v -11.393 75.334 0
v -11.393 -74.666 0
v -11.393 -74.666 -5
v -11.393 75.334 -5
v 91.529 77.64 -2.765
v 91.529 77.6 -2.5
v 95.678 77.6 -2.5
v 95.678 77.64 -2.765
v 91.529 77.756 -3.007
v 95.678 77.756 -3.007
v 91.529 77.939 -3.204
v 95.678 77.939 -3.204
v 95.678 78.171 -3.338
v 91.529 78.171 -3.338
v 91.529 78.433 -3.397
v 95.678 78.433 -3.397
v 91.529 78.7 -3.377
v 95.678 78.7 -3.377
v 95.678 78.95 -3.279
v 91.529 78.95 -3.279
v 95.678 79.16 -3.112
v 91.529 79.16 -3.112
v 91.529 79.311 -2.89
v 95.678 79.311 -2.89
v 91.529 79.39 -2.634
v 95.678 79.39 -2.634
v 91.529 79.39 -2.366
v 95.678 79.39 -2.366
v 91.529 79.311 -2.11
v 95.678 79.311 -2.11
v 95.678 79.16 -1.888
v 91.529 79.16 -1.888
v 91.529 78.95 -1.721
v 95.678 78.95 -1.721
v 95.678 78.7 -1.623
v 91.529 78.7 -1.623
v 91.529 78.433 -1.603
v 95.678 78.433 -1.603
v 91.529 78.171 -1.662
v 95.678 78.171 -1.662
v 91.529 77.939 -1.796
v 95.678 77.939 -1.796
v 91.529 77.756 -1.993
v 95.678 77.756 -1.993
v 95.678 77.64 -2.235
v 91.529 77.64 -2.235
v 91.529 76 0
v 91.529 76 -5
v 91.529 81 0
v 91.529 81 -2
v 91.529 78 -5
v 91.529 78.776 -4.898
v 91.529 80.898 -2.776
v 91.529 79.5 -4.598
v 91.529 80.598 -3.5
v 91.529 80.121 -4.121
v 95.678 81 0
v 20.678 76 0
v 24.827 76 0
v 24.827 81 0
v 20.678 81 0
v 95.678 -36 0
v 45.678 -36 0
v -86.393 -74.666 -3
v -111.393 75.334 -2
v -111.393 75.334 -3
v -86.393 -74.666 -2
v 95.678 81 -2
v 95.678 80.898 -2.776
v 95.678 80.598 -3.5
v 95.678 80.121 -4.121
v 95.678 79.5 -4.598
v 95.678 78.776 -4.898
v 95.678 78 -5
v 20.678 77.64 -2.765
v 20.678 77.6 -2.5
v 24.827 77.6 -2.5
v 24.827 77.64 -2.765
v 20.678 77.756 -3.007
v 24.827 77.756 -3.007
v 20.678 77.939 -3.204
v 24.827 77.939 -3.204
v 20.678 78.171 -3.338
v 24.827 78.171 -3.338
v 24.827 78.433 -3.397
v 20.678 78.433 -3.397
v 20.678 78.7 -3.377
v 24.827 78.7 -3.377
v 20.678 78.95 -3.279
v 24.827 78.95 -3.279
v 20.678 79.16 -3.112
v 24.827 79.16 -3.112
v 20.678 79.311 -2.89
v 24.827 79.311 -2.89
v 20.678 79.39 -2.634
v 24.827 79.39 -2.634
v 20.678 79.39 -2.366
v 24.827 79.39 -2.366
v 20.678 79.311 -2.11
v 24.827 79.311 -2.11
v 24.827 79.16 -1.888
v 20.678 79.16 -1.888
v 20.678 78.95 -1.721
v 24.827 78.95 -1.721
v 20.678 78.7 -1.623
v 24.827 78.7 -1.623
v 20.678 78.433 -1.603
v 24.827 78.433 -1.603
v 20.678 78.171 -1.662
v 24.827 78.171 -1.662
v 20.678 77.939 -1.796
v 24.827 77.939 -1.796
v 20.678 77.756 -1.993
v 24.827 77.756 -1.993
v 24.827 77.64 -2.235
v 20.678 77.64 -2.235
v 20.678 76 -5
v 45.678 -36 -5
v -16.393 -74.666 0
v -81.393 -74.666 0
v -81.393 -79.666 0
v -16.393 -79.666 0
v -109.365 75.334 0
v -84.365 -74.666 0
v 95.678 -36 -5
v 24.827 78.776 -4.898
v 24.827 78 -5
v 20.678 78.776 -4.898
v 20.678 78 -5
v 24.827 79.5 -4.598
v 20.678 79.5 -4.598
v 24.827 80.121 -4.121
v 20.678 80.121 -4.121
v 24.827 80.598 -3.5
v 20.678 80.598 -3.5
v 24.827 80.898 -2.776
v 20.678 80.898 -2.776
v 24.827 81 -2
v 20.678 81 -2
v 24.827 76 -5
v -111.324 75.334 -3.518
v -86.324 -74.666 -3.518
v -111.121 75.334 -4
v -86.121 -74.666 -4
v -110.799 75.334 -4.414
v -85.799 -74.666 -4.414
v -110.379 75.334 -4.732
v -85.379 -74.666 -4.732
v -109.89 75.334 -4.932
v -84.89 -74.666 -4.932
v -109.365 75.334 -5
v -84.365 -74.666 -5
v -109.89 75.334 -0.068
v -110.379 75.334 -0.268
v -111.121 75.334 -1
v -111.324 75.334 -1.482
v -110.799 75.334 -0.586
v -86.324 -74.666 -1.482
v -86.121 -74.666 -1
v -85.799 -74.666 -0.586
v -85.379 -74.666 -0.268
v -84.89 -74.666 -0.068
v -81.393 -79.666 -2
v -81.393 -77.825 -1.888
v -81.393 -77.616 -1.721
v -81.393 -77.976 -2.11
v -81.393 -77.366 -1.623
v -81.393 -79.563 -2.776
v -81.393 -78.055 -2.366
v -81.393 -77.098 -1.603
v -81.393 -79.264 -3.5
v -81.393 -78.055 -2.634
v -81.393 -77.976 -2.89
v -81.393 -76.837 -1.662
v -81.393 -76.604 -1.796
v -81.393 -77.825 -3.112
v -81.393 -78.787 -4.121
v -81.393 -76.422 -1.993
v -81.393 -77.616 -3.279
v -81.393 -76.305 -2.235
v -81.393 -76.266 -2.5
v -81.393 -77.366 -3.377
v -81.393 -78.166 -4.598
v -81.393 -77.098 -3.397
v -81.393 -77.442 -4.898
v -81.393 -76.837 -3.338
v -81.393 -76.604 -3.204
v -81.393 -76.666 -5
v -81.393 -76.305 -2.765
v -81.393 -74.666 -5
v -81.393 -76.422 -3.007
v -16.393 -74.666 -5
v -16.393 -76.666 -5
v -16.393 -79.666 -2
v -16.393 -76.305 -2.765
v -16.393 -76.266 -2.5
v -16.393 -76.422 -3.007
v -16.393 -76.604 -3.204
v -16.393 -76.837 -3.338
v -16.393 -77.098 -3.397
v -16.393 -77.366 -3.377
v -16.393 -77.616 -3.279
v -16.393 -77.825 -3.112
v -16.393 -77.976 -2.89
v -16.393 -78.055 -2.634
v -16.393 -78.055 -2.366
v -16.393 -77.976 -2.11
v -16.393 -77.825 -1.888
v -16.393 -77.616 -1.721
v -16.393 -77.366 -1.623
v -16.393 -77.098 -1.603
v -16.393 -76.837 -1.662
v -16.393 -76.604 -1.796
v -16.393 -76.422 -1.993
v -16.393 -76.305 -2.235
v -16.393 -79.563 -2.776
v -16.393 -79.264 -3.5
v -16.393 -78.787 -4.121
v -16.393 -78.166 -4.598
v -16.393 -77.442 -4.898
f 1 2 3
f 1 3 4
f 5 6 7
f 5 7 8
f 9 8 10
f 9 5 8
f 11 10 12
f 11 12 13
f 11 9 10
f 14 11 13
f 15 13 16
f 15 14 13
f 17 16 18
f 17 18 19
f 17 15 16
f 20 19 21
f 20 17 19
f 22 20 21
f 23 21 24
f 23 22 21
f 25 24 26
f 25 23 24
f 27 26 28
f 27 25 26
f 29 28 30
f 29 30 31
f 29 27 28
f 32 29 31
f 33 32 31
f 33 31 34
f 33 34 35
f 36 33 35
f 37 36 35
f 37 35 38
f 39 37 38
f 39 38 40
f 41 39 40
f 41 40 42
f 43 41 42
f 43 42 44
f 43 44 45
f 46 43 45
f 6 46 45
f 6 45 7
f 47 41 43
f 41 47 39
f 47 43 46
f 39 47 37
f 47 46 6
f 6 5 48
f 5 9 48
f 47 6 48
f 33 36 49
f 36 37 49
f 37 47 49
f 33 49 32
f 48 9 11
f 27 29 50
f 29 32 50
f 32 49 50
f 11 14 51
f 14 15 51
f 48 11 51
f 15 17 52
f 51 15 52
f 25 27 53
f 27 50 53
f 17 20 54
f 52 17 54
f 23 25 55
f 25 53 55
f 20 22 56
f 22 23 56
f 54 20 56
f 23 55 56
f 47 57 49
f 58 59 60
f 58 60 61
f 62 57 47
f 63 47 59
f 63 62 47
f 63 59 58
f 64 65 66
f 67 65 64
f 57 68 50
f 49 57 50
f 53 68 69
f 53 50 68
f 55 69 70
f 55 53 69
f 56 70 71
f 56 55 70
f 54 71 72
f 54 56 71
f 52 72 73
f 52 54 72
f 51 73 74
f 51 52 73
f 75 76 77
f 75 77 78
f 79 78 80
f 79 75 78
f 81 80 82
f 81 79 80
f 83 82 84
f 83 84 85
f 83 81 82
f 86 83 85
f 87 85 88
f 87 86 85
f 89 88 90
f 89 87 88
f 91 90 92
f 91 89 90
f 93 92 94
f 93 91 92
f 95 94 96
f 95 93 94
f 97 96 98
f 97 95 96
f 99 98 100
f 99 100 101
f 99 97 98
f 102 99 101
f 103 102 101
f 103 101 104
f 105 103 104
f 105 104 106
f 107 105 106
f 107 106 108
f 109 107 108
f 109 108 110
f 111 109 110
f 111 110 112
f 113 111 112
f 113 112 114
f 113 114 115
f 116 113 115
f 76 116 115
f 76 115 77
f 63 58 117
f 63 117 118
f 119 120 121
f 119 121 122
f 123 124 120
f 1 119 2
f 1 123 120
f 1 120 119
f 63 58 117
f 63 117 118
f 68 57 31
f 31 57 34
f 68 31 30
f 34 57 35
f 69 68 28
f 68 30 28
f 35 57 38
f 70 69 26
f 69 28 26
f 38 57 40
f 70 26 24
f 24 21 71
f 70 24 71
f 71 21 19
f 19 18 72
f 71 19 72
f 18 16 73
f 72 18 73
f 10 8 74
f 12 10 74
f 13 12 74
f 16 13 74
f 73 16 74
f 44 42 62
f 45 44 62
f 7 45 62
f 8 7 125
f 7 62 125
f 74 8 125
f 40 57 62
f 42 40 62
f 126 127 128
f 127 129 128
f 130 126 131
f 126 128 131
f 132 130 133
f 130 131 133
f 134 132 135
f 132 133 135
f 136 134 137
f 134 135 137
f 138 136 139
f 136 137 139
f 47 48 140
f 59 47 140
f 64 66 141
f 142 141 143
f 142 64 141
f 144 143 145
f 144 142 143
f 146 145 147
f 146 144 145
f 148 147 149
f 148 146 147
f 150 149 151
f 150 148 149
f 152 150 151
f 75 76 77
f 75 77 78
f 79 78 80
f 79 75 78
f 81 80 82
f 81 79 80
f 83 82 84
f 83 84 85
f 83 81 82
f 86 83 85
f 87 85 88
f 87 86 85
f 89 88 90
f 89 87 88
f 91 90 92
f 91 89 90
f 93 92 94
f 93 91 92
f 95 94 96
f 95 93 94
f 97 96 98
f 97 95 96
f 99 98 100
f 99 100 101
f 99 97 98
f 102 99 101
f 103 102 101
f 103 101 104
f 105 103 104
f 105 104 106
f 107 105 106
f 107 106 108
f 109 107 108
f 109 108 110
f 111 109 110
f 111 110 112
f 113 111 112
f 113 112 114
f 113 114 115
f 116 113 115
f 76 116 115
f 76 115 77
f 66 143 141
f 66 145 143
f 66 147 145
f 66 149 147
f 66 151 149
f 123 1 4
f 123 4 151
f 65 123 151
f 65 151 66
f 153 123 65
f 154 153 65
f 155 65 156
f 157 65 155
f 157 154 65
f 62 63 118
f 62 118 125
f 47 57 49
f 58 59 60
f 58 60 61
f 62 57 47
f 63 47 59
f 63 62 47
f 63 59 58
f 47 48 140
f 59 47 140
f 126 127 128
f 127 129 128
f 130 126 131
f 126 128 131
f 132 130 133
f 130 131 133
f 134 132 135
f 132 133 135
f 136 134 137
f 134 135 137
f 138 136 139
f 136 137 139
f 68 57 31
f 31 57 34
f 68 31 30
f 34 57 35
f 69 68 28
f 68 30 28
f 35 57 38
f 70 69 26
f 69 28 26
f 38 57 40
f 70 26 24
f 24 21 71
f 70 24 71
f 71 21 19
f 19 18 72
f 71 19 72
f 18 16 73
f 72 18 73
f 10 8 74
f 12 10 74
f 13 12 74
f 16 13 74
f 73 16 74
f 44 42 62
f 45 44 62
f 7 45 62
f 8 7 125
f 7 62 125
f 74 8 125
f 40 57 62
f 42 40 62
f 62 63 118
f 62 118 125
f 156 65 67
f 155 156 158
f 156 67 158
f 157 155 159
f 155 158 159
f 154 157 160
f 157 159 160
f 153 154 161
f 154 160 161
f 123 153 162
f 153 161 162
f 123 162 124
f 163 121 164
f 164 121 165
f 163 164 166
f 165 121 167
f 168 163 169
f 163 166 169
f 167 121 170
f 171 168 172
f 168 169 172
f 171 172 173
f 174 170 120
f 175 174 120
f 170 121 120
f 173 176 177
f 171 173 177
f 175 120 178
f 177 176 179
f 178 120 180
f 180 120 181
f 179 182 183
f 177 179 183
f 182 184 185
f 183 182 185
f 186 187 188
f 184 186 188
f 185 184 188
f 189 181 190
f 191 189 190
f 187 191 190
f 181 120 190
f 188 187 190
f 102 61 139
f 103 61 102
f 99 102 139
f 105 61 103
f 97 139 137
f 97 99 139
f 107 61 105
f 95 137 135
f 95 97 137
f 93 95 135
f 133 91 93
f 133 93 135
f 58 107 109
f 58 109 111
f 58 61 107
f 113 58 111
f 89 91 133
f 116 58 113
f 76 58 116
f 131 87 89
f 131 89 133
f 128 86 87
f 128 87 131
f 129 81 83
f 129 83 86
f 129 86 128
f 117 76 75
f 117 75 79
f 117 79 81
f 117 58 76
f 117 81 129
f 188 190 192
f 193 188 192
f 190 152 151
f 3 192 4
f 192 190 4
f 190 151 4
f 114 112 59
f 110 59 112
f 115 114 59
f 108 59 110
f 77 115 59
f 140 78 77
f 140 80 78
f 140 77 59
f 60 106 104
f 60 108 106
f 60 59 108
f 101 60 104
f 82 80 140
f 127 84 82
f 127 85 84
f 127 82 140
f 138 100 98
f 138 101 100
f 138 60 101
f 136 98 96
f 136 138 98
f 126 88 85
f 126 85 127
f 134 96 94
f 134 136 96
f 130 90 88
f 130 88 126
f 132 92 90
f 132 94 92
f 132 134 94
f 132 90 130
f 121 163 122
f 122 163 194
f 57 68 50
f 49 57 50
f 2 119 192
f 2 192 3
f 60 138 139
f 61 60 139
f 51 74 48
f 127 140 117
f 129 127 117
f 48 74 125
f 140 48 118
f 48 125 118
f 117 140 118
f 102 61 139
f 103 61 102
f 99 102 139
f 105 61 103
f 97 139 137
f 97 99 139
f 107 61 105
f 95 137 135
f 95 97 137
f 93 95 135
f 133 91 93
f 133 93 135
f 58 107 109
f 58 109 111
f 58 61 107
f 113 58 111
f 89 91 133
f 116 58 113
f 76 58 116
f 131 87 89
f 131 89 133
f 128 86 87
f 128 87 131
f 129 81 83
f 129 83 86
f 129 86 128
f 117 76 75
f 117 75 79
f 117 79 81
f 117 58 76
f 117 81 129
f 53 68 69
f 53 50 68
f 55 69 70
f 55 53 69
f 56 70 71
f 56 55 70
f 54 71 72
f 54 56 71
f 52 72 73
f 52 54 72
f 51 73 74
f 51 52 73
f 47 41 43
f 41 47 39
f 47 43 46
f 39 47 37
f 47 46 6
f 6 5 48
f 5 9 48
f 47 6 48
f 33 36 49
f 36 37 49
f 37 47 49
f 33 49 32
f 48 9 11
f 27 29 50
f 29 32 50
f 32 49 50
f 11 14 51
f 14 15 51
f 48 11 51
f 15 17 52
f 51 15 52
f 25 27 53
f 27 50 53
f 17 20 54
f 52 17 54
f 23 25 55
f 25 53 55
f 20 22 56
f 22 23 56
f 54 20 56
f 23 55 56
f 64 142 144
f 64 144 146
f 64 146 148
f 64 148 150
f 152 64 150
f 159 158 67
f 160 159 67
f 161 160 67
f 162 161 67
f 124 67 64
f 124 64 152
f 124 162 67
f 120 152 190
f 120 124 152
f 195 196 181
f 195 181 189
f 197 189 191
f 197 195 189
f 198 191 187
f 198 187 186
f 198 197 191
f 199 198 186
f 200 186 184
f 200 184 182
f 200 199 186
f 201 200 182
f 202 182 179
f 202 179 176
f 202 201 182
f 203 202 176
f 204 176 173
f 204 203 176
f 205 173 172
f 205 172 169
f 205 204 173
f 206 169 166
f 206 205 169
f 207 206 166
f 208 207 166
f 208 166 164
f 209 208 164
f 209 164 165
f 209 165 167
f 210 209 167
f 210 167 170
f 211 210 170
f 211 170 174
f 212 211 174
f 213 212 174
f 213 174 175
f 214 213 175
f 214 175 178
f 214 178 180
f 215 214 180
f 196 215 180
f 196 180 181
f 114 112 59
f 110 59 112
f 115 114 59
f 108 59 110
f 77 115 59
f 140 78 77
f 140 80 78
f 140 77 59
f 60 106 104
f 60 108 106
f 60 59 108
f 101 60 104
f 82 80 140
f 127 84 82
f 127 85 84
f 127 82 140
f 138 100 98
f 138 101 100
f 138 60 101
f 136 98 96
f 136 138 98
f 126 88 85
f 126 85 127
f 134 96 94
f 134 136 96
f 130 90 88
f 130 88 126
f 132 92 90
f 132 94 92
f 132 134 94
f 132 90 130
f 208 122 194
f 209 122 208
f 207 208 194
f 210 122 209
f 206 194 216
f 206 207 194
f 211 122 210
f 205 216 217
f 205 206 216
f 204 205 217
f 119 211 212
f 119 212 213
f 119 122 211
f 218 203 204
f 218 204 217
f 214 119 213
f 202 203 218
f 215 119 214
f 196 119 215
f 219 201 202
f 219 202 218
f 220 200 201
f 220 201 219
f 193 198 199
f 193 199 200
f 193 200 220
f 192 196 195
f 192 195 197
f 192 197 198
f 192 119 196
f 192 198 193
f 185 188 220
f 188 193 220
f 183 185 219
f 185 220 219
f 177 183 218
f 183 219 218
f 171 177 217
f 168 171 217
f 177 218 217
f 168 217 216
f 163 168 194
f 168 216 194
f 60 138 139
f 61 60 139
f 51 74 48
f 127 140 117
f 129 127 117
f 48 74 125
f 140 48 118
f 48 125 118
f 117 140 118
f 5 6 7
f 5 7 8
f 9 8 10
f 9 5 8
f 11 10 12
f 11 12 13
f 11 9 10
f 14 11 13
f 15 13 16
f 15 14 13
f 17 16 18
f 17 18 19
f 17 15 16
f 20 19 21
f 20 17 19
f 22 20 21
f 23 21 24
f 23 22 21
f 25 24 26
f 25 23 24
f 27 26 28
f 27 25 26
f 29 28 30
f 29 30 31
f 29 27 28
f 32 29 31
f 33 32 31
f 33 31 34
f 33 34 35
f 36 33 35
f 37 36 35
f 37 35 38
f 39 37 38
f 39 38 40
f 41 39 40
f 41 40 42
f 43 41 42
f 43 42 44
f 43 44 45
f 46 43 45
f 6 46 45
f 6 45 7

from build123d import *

# Parameters (mm, degrees)
F0_W      = 25
F0_H      = 112
F1_DEPTH  = 5
F2_W      = 25
F2_H      = 150
F3_DEPTH  = 5
F4_R      = 2
F5_W      = 75
F5_H      = 5
F6_DEPTH  = 5
F7_W      = 65
F7_H      = 5
F8_DEPTH  = 5
F9_W      = 66.702231
F9_H      = 7.951083
F10_DEPTH = 5
F11_R     = 0.9
F12_DEPTH = 100
F13_R     = 0.9
F14_DEPTH = 125
F15_R     = 3
F15_2_R   = 3


with BuildPart() as f1:
    # F0 (on Top) → F1 (new body)
    with BuildSketch(Plane.XY):
        Polygon((20.677915, 75.999999), (45.677915, -36.000001), (70.677915, -36.000001), (70.677915, 75.999999), align=None)
        with Locations((83.177915, 19.999999)):
            Rectangle(F0_W, F0_H)
    extrude(amount=F1_DEPTH)

    # F5 (on face) → F6 (join)
    with BuildSketch(Plane(origin=(0, 75.999999, 0), x_dir=(-1, 0, 0), z_dir=(0, 1, 0))):
        with Locations((-58.177915, 2.5)):
            Rectangle(F5_W, F5_H)
    extrude(amount=F6_DEPTH)

    # F9 (on face) → F10 (cut)
    with BuildSketch(Plane(origin=(0, 80.999999, 0), x_dir=(-1, 0, 0), z_dir=(0, 1, 0))):
        with Locations((-58.177915, 3.814935)):
            Rectangle(F9_W, F9_H)
    extrude(amount=-F10_DEPTH, mode=Mode.SUBTRACT)

    # F13 (on face) → F14 (cut)
    with BuildSketch(Plane(origin=(20.677915, 0, 0), x_dir=(0, -1, 0), z_dir=(-1, 0, 0))):
        with Locations((-78.499999, 2.5)):
            Circle(F13_R)
    extrude(amount=-F14_DEPTH, mode=Mode.SUBTRACT)

    # F15
    f15_edges = [f1.edges().sort_by_distance(p)[0] for p in [
        (22.752357, 80.999999, 5),
        (93.603473, 80.999999, 5),
    ]]
    fillet(f15_edges, radius=F15_R)


with BuildPart() as f3:
    # F2 (on Top) → F3 (new body)
    with BuildSketch(Plane.XY):
        Polygon((-36.392649, 75.334491), (-111.392649, 75.334491), (-86.392649, -74.665509), (-36.392649, -74.665509), align=None)
        with Locations((-23.892649, 0.334491)):
            Rectangle(F2_W, F2_H)
    extrude(amount=F3_DEPTH)

    # F4
    f4_edges = [f3.edges().sort_by_distance(p)[0] for p in [
        (-98.892649, 0.334491, 5),
        (-98.892649, 0.334491, 0),
    ]]
    fillet(f4_edges, radius=F4_R)

    # F7 (on face) → F8 (join)
    with BuildSketch(Plane.XZ.offset(74.665509)):
        with Locations((-48.892649, 2.5)):
            Rectangle(F7_W, F7_H)
    extrude(amount=F8_DEPTH)

    # F11 (on face) → F12 (cut)
    with BuildSketch(Plane.YZ.offset(-16.392649)):
        with Locations((-77.165509, 2.5)):
            Circle(F11_R)
    extrude(amount=-F12_DEPTH, mode=Mode.SUBTRACT)

    # F15#2
    f15_2_edges = [f3.edges().sort_by_distance(p)[0] for p in [
        (-48.892649, -79.665509, 5),
    ]]
    fillet(f15_2_edges, radius=F15_2_R)


with BuildPart() as f16_1:
    # F16: instance of F3
    add(f3.part.mirror(Plane.XY))


with BuildPart() as f16_2:
    # F16: instance of F1
    add(f1.part.mirror(Plane.XY))


with BuildPart() as f17_1:
    # F17: instance of F1
    add(f1.part.mirror(Plane.XY))


solid = Compound([f16_1.part, f16_2.part, f17_1.part])
